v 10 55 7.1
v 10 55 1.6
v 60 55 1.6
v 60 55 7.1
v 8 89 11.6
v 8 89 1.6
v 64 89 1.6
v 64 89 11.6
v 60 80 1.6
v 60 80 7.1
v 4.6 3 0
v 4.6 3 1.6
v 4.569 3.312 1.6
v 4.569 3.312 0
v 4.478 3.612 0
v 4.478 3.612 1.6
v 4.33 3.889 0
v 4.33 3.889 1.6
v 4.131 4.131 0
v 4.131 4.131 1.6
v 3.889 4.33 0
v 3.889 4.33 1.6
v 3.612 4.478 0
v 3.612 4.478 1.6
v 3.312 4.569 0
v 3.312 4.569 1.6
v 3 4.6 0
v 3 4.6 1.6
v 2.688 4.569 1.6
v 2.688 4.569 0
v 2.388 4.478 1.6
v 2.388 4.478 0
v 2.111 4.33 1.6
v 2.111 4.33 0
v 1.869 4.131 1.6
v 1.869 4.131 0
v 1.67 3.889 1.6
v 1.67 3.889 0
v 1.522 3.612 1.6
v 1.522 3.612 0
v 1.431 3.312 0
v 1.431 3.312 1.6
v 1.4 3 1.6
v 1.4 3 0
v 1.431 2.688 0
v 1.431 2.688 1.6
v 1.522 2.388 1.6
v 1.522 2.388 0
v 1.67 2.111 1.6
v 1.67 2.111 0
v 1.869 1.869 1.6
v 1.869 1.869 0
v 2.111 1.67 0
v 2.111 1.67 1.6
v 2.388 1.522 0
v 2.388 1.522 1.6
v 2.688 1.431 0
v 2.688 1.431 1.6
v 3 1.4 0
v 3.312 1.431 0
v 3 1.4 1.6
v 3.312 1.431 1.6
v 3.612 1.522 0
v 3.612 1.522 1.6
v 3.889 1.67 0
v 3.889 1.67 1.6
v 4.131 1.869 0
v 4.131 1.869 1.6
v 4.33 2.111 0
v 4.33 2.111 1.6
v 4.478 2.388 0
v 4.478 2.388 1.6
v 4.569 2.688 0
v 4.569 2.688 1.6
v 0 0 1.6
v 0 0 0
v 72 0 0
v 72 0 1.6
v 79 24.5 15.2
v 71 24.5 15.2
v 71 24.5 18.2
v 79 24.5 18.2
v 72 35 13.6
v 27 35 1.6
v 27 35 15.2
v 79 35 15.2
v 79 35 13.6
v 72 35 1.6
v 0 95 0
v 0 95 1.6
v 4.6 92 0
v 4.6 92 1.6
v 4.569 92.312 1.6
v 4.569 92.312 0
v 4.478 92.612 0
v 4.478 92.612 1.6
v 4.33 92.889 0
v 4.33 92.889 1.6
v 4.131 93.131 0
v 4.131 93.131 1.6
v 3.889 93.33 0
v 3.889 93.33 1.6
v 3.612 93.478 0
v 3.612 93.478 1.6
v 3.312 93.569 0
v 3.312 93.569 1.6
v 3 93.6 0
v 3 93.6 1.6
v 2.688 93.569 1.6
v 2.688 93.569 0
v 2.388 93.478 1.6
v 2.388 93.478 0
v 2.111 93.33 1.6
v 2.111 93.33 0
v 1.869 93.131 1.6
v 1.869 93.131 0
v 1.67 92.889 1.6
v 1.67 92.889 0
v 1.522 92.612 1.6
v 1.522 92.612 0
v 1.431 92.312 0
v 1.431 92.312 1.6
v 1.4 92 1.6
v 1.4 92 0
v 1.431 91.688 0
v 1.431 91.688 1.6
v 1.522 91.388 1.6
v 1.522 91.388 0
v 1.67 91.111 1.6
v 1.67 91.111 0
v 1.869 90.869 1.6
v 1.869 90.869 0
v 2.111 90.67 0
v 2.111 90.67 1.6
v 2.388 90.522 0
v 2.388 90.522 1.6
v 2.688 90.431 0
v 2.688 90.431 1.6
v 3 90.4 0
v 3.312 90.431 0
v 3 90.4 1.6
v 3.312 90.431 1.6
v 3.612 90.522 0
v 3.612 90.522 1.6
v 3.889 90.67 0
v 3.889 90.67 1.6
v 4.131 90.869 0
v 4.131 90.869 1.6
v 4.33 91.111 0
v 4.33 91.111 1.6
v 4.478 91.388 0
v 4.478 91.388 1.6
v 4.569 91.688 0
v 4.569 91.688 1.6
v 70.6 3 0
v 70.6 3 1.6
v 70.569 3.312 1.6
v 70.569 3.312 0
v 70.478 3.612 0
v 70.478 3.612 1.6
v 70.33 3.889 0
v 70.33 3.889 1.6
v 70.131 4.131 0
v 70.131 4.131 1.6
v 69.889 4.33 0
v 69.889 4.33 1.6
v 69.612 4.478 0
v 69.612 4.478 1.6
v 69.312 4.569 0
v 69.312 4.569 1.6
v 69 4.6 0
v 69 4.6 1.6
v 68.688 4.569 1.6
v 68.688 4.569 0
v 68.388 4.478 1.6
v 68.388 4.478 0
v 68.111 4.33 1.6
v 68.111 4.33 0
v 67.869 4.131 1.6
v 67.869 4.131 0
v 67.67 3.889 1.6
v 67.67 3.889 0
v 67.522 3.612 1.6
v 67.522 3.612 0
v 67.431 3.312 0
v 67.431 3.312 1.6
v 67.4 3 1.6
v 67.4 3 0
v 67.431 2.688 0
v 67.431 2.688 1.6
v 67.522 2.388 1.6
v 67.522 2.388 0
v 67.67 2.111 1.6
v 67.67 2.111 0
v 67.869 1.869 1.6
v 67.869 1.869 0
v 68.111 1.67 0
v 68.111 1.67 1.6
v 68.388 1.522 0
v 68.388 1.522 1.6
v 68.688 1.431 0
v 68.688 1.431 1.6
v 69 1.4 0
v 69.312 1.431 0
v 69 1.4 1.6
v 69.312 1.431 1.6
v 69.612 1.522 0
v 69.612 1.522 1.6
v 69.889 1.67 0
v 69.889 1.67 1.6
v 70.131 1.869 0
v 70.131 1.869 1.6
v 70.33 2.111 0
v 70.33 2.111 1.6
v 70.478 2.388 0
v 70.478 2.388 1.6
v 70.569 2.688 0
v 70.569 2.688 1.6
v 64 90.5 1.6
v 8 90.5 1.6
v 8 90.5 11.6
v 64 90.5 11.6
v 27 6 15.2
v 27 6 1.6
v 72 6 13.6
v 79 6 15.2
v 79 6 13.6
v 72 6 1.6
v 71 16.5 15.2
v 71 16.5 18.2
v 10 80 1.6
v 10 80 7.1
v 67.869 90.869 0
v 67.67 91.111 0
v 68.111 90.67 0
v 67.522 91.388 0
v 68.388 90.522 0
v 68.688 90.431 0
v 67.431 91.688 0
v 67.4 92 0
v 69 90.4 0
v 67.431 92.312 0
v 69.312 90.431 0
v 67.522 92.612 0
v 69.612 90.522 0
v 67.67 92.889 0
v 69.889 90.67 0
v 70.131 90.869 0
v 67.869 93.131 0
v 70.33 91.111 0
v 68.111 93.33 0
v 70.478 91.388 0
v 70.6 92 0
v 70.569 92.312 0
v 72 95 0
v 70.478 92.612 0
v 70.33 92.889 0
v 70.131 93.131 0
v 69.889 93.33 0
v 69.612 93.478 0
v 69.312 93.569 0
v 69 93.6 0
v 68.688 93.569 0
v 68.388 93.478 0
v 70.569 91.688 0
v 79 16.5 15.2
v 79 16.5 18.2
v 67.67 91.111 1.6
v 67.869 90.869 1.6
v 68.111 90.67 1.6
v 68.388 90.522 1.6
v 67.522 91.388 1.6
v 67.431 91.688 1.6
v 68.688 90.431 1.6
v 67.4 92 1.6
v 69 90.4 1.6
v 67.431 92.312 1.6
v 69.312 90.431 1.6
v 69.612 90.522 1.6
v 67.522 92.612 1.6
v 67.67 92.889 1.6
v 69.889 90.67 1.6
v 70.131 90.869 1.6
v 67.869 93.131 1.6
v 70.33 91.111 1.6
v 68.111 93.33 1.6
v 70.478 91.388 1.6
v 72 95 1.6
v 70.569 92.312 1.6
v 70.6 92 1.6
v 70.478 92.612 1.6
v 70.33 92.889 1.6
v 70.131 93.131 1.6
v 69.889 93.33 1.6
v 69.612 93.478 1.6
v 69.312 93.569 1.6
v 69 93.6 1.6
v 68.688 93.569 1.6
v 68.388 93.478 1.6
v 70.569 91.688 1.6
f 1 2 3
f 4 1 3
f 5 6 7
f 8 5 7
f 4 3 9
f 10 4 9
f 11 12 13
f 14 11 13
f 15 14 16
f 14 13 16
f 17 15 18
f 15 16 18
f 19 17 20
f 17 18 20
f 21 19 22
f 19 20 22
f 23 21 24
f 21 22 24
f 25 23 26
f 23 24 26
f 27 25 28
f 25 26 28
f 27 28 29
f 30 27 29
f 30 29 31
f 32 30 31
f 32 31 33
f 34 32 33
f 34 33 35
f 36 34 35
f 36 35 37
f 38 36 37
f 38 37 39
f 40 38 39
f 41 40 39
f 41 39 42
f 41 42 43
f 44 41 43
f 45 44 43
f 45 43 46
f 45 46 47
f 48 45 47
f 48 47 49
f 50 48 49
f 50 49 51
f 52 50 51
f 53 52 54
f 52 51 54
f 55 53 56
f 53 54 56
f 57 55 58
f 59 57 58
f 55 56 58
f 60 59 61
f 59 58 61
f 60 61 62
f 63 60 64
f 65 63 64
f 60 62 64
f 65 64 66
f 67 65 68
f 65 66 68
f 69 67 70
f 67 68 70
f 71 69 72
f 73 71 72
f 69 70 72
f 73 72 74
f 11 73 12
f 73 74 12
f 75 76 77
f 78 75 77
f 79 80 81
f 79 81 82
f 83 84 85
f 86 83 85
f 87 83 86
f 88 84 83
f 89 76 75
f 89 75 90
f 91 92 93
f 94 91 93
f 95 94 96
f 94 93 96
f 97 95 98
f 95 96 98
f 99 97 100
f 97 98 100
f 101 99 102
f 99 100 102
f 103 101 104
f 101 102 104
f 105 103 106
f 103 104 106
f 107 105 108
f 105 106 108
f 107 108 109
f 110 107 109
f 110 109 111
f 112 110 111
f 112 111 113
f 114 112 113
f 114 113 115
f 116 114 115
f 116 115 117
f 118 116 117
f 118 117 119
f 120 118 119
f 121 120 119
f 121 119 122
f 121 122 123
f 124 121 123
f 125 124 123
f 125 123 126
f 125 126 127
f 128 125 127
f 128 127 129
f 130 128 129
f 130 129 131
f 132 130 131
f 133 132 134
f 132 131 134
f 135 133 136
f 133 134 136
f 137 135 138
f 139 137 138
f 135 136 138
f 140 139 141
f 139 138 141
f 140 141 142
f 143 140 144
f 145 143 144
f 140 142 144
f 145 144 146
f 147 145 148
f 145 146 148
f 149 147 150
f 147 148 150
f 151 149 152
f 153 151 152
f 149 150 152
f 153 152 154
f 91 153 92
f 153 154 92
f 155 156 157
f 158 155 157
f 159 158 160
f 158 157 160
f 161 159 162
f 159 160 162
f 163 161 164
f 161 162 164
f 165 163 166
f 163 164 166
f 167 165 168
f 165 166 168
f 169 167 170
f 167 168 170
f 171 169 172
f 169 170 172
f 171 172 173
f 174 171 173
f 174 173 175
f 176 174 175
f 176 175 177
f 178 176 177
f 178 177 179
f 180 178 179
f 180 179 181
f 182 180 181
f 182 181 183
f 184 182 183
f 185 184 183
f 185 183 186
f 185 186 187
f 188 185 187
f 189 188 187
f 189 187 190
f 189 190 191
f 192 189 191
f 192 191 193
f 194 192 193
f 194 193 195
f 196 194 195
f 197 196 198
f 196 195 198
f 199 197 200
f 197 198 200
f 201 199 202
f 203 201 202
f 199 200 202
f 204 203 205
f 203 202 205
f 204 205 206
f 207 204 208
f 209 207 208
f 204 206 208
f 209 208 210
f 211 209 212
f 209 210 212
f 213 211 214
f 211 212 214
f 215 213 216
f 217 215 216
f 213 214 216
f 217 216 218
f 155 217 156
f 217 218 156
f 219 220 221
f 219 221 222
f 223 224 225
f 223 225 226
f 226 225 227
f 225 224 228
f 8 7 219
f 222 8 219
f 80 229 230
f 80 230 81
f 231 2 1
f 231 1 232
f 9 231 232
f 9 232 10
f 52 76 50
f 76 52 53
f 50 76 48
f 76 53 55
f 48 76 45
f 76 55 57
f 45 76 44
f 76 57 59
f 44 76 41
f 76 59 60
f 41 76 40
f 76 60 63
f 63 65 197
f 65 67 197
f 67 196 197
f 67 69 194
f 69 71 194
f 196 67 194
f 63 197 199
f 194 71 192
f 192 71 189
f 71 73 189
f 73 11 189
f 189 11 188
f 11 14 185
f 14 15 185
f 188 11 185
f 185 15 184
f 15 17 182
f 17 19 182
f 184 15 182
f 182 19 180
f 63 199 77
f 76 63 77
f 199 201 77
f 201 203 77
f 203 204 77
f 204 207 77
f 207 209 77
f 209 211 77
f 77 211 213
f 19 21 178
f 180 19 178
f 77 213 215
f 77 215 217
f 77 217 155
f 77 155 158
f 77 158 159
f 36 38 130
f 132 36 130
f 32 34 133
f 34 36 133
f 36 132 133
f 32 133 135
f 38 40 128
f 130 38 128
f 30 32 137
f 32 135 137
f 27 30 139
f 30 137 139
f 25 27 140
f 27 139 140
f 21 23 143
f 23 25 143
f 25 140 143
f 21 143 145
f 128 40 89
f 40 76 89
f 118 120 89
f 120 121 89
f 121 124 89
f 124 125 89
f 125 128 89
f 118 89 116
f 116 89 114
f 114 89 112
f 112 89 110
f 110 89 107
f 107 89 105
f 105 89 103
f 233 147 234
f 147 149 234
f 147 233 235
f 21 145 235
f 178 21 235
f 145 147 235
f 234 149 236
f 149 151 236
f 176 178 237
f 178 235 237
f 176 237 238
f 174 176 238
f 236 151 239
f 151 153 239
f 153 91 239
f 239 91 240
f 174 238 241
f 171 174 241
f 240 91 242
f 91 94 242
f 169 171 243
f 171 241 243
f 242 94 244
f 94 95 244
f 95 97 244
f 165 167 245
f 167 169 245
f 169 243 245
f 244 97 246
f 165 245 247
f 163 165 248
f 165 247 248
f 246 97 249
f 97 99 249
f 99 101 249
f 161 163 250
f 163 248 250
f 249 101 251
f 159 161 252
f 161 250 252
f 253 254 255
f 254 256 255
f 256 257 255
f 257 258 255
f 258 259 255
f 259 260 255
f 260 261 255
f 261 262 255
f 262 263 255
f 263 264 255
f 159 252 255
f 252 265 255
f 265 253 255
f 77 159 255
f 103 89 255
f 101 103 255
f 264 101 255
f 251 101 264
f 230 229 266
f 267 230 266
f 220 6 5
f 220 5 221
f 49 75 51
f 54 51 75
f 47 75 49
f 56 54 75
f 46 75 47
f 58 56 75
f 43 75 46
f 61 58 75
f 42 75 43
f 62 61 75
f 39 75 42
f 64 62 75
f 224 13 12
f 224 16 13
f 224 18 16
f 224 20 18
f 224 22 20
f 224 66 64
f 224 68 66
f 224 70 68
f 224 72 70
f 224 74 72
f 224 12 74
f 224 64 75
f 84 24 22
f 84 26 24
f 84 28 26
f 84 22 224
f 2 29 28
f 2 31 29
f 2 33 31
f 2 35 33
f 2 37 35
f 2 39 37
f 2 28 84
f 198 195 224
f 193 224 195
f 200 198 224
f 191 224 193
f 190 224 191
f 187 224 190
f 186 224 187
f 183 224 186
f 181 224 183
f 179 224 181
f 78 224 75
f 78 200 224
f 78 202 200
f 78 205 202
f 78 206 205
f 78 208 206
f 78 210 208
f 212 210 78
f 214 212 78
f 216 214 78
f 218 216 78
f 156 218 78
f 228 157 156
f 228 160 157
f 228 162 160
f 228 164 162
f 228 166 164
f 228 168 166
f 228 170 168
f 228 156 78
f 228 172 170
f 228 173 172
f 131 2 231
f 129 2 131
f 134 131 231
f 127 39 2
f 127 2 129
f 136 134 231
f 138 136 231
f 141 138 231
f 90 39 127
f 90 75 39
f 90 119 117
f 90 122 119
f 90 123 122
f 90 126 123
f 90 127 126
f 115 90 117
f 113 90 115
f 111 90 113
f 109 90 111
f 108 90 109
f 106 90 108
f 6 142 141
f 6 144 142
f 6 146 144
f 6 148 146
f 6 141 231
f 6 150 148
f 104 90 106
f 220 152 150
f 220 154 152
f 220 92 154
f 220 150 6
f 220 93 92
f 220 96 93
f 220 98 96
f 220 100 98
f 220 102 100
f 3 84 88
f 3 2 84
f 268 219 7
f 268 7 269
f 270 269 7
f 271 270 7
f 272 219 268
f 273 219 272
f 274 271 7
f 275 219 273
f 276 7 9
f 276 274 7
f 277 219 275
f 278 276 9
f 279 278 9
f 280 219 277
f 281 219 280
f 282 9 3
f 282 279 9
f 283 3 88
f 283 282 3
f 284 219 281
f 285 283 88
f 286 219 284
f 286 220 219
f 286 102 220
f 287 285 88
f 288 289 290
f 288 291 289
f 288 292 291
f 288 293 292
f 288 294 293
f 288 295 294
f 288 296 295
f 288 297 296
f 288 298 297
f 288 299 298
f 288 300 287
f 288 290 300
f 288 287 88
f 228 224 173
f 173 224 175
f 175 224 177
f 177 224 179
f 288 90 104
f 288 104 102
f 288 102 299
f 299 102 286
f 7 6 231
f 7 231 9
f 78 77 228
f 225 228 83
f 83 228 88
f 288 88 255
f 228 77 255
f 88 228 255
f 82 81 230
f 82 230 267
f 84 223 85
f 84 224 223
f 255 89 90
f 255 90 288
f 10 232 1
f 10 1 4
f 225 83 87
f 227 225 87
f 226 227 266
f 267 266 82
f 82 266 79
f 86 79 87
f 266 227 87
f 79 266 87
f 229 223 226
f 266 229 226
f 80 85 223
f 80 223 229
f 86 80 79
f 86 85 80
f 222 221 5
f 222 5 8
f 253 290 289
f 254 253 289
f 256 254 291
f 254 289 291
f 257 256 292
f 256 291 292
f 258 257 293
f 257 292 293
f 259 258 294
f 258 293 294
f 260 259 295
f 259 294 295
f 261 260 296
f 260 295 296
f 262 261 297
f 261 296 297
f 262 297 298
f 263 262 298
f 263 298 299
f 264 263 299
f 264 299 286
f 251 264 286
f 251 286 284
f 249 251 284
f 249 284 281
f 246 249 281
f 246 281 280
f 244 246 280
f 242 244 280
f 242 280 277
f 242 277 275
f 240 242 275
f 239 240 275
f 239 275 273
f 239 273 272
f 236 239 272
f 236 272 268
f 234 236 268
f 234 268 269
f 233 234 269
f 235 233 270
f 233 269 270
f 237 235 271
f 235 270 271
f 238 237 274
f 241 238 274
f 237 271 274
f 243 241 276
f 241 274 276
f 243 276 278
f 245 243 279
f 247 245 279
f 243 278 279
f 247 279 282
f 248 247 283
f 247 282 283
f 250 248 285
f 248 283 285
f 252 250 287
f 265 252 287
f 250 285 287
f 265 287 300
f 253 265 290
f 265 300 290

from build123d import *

# Parameters (mm, degrees)
SKETCH_W     = 72
SKETCH_H     = 95
PAD_DEPTH    = 1.6
SKETCH001_R  = 1.6
POCKET_DEPTH = 1.601
SKETCH006_W  = 45
SKETCH006_H  = 29
PAD004_DEPTH = 12
SKETCH005_W  = 52
SKETCH005_H  = 29
PAD005_DEPTH = 1.6
SKETCH011_W  = 8
SKETCH011_H  = 8
PAD008_DEPTH = 3
SKETCH013_W  = 56
SKETCH013_H  = 1.5
PAD010_DEPTH = 10
SKETCH014_W  = 50
SKETCH014_H  = 25
PAD011_DEPTH = 5.5


with BuildPart() as part:
    # Sketch → Pad (new body)
    with BuildSketch(Plane.XY):
        with Locations((36, 47.5)):
            Rectangle(SKETCH_W, SKETCH_H)
    extrude(amount=PAD_DEPTH)

    # Sketch001 (on Face6 of Pad) → Pocket (cut, through all)
    with BuildSketch(Plane.XY.offset(1.6)):
        with Locations((3, 3)):
            Circle(SKETCH001_R)
        with Locations((69, 3)):
            Circle(SKETCH001_R)
        with Locations((69, 92)):
            Circle(SKETCH001_R)
        with Locations((3, 92)):
            Circle(SKETCH001_R)
    extrude(amount=-POCKET_DEPTH, mode=Mode.SUBTRACT)

    # Sketch006 (on Face5 of Pocket) → Pad004 (join)
    with BuildSketch(Plane.XY.offset(1.6)):
        with Locations((49.5, 20.5)):
            Rectangle(SKETCH006_W, SKETCH006_H)
    extrude(amount=PAD004_DEPTH)

    # Sketch005 (on Face5 of Pocket) → Pad005 (join)
    with BuildSketch(Plane.XY.offset(13.6)):
        with Locations((53, 20.5)):
            Rectangle(SKETCH005_W, SKETCH005_H)
    extrude(amount=PAD005_DEPTH)

    # Sketch011 (on Face20 of Pad005) → Pad008 (join)
    with BuildSketch(Plane.XY.offset(15.2)):
        with Locations((75, 20.5)):
            Rectangle(SKETCH011_W, SKETCH011_H)
    extrude(amount=PAD008_DEPTH)

    # Sketch013 (on Face5 of Pad008) → Pad010 (join)
    with BuildSketch(Plane.XY.offset(1.6)):
        with Locations((36, 89.75)):
            Rectangle(SKETCH013_W, SKETCH013_H)
    extrude(amount=PAD010_DEPTH)

    # Sketch014 (on Face5 of Pad010) → Pad011 (join)
    with BuildSketch(Plane.XY.offset(1.6)):
        with Locations((35, 67.5)):
            Rectangle(SKETCH014_W, SKETCH014_H)
    extrude(amount=PAD011_DEPTH)


solid = part.part
